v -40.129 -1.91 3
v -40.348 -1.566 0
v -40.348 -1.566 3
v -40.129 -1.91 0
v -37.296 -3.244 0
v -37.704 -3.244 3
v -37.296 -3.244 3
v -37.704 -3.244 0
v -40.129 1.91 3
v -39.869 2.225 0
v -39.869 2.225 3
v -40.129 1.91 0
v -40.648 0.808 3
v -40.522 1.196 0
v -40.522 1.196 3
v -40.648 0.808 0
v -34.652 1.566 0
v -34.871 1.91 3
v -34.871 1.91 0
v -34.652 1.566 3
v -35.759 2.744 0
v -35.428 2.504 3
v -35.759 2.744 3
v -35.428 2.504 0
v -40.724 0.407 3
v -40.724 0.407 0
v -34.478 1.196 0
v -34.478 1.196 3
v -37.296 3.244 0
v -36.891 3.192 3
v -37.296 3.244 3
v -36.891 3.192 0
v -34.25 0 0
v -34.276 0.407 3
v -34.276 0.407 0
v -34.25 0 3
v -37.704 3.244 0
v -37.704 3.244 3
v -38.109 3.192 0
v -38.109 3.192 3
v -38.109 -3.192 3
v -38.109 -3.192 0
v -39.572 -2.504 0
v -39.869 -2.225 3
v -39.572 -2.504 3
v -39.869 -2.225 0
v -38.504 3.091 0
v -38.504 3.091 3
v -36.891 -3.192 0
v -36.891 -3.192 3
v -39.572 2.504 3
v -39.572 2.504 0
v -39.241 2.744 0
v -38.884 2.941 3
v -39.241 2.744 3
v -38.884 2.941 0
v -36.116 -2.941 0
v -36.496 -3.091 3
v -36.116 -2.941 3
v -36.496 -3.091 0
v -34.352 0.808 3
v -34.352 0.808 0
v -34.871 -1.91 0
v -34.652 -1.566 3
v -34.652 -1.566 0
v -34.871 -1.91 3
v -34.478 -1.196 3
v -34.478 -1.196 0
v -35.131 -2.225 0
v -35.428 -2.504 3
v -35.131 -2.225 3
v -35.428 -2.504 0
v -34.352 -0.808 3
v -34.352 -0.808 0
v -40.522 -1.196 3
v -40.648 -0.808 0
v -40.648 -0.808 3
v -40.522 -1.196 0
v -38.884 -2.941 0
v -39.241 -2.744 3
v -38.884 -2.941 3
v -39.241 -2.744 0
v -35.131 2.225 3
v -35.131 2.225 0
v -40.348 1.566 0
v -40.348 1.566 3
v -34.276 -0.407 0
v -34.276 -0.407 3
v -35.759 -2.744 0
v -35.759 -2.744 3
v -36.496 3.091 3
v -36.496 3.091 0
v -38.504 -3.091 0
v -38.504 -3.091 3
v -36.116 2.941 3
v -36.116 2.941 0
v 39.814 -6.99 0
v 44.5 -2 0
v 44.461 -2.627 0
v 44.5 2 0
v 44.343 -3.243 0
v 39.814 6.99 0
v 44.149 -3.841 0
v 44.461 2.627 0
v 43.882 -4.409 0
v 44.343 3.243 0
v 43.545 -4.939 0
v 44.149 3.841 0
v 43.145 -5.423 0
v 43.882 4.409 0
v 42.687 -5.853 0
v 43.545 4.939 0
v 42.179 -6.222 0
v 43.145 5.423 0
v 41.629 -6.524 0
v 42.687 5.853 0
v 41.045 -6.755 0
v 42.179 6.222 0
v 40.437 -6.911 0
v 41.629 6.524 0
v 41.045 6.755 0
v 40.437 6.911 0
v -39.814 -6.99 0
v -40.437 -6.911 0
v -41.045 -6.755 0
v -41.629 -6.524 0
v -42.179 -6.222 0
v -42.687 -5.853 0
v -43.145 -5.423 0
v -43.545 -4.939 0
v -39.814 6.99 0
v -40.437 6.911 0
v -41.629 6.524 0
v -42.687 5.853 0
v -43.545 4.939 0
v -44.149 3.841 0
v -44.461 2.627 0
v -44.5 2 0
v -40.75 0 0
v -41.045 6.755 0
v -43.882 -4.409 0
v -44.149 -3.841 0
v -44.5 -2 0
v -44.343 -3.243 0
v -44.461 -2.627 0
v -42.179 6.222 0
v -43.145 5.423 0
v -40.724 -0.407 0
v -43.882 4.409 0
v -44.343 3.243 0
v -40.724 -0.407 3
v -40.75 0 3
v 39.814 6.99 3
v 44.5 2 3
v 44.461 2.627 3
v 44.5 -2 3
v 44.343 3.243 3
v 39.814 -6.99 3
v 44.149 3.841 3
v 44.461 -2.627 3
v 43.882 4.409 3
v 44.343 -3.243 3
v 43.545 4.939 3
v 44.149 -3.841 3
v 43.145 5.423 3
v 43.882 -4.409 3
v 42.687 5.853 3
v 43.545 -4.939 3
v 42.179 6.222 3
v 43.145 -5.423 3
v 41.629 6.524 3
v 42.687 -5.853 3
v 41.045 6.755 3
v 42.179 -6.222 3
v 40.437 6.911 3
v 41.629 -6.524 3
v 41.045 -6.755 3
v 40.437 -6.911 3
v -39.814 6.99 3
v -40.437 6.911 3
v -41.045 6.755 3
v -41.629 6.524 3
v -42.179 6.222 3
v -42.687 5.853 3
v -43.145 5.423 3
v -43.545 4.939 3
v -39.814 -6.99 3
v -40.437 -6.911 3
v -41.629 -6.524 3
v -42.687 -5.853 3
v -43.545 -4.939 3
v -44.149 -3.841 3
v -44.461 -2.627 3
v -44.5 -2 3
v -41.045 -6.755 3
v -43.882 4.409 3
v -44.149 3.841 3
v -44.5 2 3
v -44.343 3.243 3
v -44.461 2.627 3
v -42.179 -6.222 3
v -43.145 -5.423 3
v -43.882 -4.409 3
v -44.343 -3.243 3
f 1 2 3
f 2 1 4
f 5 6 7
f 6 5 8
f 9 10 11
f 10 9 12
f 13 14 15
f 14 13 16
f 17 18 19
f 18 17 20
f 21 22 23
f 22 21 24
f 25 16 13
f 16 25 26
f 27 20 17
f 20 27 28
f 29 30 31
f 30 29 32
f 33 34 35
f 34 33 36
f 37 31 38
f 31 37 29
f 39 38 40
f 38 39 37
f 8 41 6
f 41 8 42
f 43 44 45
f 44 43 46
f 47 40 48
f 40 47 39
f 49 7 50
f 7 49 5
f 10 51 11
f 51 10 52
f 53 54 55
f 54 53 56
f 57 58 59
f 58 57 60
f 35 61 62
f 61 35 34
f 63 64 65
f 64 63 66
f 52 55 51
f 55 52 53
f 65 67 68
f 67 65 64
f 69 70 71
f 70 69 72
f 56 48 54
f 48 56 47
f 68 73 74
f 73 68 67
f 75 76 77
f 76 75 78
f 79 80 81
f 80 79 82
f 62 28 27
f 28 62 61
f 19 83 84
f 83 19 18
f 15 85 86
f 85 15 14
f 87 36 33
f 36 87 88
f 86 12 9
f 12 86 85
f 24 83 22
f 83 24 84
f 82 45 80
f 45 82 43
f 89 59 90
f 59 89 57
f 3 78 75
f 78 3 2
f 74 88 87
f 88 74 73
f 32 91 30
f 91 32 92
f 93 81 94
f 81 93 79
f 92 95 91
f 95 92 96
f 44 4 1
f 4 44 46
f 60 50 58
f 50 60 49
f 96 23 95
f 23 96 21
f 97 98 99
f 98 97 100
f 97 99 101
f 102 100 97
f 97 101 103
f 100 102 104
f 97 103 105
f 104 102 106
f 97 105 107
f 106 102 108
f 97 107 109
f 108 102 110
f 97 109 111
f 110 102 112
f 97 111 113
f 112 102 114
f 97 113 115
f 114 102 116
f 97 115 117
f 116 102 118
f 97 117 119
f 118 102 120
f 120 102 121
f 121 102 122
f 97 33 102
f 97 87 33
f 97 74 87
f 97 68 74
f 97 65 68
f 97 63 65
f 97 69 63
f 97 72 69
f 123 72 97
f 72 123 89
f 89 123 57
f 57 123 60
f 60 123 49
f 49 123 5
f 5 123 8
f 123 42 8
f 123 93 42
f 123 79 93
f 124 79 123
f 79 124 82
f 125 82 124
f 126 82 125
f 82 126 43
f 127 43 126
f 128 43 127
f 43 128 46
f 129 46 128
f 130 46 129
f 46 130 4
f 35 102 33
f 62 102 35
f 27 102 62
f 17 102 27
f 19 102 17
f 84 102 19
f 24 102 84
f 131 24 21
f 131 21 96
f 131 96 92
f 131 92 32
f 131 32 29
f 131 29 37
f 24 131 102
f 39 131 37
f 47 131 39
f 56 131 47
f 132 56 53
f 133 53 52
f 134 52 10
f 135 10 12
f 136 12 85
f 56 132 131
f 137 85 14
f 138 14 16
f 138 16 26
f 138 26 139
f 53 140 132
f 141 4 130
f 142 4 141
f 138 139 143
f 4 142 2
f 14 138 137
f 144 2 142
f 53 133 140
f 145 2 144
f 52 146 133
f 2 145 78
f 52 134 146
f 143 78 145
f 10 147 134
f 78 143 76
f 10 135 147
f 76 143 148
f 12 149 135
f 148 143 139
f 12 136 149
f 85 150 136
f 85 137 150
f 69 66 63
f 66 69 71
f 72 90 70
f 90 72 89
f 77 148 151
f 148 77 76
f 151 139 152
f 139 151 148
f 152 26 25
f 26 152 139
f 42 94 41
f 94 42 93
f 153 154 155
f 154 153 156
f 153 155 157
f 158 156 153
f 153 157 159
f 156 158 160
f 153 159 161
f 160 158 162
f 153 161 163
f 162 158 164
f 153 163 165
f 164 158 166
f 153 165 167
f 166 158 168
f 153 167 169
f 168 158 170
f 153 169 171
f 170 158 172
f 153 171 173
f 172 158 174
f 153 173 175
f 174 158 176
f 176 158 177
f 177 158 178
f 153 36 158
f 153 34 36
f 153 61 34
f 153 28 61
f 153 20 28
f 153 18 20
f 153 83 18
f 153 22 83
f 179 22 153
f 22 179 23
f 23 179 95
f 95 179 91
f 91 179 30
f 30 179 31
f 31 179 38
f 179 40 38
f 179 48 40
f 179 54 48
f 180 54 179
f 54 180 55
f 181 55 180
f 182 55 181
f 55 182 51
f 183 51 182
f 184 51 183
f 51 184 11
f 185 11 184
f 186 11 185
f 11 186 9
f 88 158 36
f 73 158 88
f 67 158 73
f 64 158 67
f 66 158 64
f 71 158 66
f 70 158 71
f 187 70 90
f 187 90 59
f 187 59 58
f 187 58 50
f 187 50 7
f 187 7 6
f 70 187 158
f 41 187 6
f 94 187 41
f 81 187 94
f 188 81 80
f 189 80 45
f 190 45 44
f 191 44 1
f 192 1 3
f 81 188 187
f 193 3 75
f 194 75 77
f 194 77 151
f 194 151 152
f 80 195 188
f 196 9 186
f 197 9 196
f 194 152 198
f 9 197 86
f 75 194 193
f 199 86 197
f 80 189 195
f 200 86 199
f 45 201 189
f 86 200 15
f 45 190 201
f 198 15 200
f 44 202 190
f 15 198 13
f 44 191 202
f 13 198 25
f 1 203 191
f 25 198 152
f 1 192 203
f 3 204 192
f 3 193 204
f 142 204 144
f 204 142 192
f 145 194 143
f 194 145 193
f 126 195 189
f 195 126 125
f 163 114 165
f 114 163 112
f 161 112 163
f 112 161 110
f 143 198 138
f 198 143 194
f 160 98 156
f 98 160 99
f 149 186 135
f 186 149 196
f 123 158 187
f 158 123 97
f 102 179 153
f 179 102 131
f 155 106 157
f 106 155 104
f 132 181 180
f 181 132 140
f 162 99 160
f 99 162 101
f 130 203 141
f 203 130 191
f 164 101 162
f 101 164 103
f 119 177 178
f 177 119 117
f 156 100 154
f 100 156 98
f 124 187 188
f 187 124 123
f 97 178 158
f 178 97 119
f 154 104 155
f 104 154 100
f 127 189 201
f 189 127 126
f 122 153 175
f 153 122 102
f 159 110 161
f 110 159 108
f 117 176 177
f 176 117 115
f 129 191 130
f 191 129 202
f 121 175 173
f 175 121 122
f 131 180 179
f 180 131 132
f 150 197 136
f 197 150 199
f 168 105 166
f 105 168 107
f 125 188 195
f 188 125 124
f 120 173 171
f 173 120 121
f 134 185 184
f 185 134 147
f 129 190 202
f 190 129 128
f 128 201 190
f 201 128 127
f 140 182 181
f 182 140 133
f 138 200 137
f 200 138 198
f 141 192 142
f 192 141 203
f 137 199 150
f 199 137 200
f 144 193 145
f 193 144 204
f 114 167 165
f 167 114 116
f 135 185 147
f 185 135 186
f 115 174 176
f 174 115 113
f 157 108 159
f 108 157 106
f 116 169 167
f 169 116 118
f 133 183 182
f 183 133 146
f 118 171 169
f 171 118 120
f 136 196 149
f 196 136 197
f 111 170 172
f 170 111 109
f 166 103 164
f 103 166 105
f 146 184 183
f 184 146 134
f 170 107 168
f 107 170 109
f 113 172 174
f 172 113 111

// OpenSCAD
$fn = 50;


difference() {
	union() {
		hull() {
			translate(v = [-39.5000000000, 2.0000000000, 0]) {
				cylinder(h = 3, r = 5);
			}
			translate(v = [39.5000000000, 2.0000000000, 0]) {
				cylinder(h = 3, r = 5);
			}
			translate(v = [-39.5000000000, -2.0000000000, 0]) {
				cylinder(h = 3, r = 5);
			}
			translate(v = [39.5000000000, -2.0000000000, 0]) {
				cylinder(h = 3, r = 5);
			}
		}
	}
	union() {
		translate(v = [-37.5000000000, 0.0000000000, 0]) {
			cylinder(h = 3, r = 3.2500000000);
		}
		translate(v = [-37.5000000000, 0.0000000000, 0]) {
			cylinder(h = 3, r = 1.8000000000);
		}
		translate(v = [-37.5000000000, 0.0000000000, 0]) {
			cylinder(h = 3, r = 1.8000000000);
		}
		translate(v = [-37.5000000000, 0.0000000000, 0]) {
			cylinder(h = 3, r = 1.8000000000);
		}
	}
}
